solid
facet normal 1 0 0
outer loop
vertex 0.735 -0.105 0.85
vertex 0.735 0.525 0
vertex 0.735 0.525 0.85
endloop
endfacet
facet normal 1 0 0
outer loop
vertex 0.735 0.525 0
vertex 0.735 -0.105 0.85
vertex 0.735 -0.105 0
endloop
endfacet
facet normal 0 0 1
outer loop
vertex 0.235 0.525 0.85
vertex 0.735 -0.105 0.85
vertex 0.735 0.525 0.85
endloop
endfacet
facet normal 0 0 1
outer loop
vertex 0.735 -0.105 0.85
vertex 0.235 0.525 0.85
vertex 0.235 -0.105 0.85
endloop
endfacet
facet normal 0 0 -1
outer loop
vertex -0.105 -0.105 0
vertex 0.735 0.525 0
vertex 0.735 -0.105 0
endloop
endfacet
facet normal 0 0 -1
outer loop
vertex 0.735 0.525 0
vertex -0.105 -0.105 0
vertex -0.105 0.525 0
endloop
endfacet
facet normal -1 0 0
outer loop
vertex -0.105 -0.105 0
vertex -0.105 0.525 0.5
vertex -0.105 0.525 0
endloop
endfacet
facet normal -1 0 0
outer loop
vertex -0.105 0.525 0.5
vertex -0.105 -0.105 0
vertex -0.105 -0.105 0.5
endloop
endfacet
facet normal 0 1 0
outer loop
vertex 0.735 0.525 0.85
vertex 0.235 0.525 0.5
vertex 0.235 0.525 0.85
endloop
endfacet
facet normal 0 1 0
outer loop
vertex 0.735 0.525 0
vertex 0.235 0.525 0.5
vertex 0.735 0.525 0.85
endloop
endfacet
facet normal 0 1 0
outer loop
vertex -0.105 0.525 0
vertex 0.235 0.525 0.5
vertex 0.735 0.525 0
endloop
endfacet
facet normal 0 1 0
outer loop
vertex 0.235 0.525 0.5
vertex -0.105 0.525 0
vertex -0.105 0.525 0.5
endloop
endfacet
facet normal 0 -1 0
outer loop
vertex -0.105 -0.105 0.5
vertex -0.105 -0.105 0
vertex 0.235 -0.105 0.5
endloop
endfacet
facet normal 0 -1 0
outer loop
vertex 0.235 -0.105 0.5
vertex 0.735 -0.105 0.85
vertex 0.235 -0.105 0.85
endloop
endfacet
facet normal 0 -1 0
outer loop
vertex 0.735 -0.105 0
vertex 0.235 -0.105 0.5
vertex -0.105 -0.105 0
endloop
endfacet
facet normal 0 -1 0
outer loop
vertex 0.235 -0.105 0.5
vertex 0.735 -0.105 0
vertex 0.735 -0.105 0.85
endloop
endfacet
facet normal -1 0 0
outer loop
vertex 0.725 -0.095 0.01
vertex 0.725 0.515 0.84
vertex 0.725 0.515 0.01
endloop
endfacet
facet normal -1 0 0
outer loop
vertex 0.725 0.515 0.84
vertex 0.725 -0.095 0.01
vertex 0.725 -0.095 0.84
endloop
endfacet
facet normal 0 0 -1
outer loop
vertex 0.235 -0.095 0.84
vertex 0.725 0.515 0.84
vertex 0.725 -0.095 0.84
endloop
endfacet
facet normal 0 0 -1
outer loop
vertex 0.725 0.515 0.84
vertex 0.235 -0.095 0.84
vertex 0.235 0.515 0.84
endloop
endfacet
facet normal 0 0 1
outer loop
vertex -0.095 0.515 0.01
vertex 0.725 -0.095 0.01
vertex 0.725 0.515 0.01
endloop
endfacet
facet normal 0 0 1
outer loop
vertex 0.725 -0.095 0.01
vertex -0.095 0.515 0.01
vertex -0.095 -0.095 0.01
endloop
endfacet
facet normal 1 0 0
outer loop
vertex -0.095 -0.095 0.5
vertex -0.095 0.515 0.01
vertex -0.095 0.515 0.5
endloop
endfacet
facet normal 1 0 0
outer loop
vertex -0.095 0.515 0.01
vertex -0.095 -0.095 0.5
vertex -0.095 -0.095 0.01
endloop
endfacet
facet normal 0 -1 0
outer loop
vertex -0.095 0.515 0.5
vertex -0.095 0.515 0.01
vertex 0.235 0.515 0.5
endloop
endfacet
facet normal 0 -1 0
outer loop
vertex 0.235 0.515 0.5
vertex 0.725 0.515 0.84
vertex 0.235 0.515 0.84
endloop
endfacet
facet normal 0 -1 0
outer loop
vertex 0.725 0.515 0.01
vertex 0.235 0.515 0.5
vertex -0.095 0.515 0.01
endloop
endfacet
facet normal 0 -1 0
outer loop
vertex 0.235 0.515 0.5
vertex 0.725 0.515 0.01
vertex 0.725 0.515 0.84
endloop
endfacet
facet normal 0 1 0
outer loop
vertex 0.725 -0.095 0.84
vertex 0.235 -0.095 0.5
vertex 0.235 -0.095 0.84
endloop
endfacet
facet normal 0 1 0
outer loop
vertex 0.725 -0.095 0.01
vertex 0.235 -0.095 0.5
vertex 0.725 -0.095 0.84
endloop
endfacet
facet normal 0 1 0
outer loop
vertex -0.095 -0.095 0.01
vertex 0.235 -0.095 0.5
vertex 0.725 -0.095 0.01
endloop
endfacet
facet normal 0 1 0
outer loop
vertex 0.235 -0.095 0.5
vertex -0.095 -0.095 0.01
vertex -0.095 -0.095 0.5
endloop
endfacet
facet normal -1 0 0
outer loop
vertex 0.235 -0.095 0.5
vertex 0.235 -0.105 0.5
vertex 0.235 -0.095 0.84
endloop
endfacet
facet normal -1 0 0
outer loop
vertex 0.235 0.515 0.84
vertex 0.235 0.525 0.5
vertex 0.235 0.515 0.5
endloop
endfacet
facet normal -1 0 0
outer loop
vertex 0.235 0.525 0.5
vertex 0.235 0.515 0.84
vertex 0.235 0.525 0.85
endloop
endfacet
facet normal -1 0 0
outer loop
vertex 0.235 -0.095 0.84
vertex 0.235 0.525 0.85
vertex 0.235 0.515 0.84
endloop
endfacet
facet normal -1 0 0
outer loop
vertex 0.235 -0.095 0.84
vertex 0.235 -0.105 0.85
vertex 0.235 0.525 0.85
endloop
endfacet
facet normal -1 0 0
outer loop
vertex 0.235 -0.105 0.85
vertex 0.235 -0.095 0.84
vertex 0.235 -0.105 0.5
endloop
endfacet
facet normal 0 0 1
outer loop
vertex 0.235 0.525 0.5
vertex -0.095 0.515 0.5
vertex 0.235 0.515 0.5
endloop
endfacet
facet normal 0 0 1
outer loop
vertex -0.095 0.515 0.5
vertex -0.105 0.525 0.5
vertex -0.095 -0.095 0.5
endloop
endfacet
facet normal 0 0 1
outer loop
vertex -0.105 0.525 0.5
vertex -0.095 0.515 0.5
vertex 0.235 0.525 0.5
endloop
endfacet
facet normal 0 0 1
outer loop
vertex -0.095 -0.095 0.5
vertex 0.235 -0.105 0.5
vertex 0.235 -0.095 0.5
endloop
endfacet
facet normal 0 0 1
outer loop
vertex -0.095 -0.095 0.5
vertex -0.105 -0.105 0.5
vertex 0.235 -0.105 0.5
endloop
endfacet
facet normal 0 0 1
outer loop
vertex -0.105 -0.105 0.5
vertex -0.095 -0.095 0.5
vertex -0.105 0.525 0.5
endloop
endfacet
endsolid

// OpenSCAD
$fn=15;


hasCap = false;
hasBottle = false;
hasLiquid = false;
hasCardboard = true;
showBox = true;

scale([0.01, 0.01, 0.01])
//referenceCube();
//fakeCounter();
//scale([0.01, 0.01, 0.01])
//translate([0, 0, 41]) 

bottleBox();
//bottle();


module bottle() {
    if (hasCap) {
        color("green")
        translate([0, 0, 80])
        cylinder(d1=9, d2=7, h=2);
    } 
    
    if (hasBottle) {
        difference() {
            subBottle();
            
            translate([0, 0, 1])
            scale([0.9, 0.9, 0.95])
            subBottle();
            
            translate([0, 0, 0.2])
            cylinder(d=7, h=100);
        }
    }
    
    if (hasLiquid) {
        color("yellow")
        translate([0, 0, 1])
        scale([0.9, 0.9, 0.95])
        subBottle();
    }
}

module bottleBox() {
    if (showBox) {
        if (hasCardboard) {
            color("blue")
            translate([-21/2, -21/2, 0])
            difference() {
                cube([21*4 , 21*3, 85]);
                
                translate([1, 1, 1])
                cube([21*4 - 2, 21*3 - 2, 83]);
                
                translate([-1, -1, 50])
                cube([35, 22 * 3, 36]);
            }
        }
        
        for (x = [0 : 1]) {
            for (y = [0 : 2]) {
                translate([x * 21, y * 21, 0])
                bottle();
            }
        }
        
    }
}

module subBottle() {
    glassBottom();
    glassTaper();
    glassStem();
}

module glassBottom() {
    translate([0, 0, 3])
    cylinder(d=20, h=37);
    
    cylinder(d1=18, d2=20, h=3);
}

module glassTaper() {
    translate([0, 0, 40])
    sphere(d=20);
}

module glassStem() {
    translate([0, 0, 45])
    cylinder(d1=12, d2=8, h=35);
    
    translate([0, 0, 77])
    cylinder(d=9, h=1);
}

module referenceCube() {
    translate([-50, -200, 0])
    cube([100, 100, 100]);
}
